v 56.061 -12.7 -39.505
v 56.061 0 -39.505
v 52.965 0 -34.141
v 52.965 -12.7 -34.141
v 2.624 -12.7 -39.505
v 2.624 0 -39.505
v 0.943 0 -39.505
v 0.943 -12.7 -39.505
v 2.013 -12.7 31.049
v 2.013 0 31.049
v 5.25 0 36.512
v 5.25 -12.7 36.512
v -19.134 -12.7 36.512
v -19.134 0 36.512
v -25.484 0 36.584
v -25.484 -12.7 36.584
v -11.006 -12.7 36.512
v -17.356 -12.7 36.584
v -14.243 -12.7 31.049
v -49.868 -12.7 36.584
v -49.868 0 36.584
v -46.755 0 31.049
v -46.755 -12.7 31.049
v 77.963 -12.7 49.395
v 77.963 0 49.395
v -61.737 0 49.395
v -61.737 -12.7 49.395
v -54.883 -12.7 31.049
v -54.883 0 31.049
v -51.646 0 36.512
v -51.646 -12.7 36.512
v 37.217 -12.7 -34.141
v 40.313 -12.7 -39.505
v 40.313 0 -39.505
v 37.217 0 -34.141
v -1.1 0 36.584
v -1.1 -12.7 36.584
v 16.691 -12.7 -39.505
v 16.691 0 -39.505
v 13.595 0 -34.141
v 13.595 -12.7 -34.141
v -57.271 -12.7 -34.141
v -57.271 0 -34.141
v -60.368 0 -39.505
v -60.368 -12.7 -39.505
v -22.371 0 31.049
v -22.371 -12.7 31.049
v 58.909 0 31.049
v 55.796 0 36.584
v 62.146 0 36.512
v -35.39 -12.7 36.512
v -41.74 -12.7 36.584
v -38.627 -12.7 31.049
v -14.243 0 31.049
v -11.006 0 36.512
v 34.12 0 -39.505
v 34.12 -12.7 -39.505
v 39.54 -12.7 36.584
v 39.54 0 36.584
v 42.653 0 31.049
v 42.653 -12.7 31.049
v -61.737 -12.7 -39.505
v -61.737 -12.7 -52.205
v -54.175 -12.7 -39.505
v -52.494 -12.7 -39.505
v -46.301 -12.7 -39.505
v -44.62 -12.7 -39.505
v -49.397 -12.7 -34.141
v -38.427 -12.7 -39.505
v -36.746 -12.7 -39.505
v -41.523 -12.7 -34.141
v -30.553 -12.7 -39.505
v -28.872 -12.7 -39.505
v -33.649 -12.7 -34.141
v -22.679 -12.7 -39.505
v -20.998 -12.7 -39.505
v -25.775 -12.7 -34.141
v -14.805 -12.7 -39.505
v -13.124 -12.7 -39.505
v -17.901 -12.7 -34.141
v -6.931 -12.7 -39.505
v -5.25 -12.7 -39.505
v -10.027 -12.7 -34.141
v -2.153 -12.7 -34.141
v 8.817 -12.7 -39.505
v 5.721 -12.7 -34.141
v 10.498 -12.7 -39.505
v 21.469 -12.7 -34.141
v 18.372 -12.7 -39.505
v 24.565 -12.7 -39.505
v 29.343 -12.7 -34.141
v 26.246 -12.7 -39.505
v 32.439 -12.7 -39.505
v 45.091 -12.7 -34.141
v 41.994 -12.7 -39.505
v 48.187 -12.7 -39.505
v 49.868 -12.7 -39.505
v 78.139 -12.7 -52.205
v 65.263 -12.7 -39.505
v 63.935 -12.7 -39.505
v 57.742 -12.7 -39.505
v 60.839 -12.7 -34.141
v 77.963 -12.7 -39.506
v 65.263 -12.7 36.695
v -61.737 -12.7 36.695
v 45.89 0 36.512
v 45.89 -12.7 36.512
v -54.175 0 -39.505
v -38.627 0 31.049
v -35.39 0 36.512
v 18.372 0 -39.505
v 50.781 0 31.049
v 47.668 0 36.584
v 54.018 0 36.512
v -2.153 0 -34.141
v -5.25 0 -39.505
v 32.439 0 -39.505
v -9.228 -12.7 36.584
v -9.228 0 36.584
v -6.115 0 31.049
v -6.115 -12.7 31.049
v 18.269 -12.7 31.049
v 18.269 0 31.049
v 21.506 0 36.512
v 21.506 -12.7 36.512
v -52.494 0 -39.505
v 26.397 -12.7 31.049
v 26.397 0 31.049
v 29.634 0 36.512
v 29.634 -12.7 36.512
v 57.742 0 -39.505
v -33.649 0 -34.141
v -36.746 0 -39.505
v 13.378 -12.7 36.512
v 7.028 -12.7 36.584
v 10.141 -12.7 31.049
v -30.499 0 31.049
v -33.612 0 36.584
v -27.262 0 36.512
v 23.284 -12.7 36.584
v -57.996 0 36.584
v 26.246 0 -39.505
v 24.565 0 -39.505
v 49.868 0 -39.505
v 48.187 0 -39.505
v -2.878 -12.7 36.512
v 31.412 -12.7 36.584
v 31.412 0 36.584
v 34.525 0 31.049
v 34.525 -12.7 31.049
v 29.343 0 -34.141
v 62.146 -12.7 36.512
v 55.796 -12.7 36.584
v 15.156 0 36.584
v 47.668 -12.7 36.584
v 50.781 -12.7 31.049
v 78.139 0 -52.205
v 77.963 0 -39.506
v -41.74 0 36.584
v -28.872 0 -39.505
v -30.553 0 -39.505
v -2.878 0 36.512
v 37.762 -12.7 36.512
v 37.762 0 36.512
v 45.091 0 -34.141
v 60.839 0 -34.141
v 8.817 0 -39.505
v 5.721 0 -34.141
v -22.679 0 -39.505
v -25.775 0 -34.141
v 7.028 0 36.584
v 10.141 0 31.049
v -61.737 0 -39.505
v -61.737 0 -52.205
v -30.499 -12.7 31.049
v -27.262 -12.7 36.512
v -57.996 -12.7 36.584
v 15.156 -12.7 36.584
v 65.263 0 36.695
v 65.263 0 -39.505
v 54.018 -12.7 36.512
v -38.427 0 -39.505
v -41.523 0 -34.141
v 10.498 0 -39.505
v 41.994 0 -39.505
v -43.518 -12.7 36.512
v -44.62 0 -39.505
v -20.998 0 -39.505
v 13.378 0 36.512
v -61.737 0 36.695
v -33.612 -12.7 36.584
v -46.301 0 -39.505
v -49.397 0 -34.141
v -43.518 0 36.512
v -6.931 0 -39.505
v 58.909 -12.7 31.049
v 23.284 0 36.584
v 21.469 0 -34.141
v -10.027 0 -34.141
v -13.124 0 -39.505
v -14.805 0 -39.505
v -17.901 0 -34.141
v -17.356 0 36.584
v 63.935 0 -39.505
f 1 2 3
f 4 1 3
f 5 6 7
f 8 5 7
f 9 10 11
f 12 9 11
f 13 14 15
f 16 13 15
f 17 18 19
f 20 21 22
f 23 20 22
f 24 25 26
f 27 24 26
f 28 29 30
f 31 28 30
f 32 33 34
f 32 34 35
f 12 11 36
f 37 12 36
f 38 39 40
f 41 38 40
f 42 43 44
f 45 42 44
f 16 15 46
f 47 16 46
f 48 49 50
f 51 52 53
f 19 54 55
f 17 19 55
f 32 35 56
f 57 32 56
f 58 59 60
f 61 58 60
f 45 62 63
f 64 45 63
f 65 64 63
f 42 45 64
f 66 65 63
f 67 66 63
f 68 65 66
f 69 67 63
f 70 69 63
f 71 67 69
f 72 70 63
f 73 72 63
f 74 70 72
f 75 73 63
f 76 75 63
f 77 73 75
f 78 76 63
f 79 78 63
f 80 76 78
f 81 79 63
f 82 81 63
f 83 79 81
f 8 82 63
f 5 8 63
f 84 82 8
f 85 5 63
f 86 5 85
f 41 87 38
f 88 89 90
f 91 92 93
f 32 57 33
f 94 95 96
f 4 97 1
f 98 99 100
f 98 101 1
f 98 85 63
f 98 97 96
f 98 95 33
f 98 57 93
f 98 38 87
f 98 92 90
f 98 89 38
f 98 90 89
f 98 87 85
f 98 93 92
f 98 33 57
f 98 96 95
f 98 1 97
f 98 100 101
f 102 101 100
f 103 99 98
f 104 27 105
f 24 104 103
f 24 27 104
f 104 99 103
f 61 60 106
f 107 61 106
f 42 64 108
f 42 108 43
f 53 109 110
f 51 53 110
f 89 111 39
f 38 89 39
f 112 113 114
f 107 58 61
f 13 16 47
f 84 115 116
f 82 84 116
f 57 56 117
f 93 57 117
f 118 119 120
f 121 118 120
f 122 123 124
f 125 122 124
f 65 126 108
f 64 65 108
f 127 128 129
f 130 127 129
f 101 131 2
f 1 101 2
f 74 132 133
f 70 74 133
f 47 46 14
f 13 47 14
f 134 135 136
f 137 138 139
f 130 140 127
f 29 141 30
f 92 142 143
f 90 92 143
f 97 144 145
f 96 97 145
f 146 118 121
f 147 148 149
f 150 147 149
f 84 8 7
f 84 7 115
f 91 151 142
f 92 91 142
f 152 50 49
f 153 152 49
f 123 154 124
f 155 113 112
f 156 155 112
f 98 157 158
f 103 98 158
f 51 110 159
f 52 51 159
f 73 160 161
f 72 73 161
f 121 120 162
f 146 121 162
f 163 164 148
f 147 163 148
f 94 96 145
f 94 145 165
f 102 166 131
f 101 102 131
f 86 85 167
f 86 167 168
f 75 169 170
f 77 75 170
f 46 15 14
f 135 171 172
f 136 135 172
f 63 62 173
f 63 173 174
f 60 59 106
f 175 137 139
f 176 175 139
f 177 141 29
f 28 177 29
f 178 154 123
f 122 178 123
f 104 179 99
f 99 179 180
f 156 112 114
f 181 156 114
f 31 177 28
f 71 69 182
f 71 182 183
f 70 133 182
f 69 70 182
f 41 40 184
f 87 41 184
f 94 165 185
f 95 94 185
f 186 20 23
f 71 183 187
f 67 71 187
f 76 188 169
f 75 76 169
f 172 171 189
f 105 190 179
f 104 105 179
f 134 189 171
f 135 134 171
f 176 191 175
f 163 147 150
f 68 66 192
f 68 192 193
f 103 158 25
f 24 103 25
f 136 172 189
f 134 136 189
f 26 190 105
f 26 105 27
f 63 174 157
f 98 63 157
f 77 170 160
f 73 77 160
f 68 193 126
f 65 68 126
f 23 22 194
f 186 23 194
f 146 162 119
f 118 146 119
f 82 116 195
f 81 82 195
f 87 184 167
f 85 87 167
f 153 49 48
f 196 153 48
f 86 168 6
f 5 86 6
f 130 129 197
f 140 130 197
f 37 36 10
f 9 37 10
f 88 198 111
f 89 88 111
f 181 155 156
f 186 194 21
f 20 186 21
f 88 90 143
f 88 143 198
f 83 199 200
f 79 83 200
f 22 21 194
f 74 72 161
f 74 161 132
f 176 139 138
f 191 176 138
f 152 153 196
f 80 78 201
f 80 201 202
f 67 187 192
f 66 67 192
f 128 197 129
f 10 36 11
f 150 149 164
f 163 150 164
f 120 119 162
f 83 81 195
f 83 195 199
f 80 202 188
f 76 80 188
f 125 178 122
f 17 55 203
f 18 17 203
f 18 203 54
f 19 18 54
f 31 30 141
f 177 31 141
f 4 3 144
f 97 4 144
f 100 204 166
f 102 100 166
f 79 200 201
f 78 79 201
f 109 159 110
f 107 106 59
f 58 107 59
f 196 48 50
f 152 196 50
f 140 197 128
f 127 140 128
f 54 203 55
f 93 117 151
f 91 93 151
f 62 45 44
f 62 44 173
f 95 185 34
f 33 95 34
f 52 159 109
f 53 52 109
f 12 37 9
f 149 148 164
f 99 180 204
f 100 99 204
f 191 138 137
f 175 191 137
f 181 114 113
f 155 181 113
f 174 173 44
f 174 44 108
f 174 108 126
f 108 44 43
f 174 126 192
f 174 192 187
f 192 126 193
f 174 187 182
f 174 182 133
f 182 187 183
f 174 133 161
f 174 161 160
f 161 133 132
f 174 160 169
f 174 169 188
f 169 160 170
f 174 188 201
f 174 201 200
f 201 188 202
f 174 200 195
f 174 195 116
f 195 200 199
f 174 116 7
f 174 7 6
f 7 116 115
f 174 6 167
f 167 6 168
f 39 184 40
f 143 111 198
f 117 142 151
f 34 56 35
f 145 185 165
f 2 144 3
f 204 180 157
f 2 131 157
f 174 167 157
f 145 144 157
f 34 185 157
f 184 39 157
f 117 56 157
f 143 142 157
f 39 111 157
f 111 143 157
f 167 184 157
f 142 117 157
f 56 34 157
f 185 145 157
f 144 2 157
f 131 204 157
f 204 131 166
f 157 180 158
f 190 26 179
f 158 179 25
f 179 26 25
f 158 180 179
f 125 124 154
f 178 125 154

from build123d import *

# Parameters (mm, degrees)
F0_W     = 127
F0_H     = 12.7
F1_DEPTH = 12.7
F3_DEPTH = 12.7
F5_DEPTH = 12.7


with BuildPart() as f1:
    # F0 (on Front) → F1 (new body)
    with BuildSketch(Plane.XZ):
        Polygon((65.263382, 49.395234), (65.263382, 36.695234), (65.263382, -39.504766), (77.963382, -39.505983), (77.963382, 49.395234), align=None)
        with Locations((1.763382, 43.045234)):
            Rectangle(F0_W, F0_H)
        Polygon((77.963382, -39.505983), (65.263382, -39.504766), (-61.736618, -39.504766), (-61.736618, -52.204766), (78.139244, -52.204766), align=None)
    extrude(amount=F1_DEPTH)

    # F4 (on Front) → F5 (join)
    with BuildSketch(Plane.XZ):
        Polygon((-54.096439, -39.640051), (-57.271437, -34.140791), (-60.446439, -39.640051), align=None)
        Polygon((-46.222439, -39.640051), (-49.397437, -34.140791), (-52.572439, -39.640051), align=None)
        Polygon((-38.348439, -39.640051), (-41.523437, -34.140791), (-44.698439, -39.640051), align=None)
        Polygon((-30.474439, -39.640051), (-33.649437, -34.140791), (-36.824439, -39.640051), align=None)
        Polygon((-22.600439, -39.640051), (-25.775437, -34.140791), (-28.950439, -39.640051), align=None)
        Polygon((-14.726439, -39.640051), (-17.901437, -34.140791), (-21.076439, -39.640051), align=None)
        Polygon((-6.852439, -39.640051), (-10.027437, -34.140791), (-13.202439, -39.640051), align=None)
        Polygon((1.021561, -39.640051), (-2.153437, -34.140791), (-5.328439, -39.640051), align=None)
        Polygon((8.895561, -39.640051), (5.720563, -34.140791), (2.545561, -39.640051), align=None)
        Polygon((16.769561, -39.640051), (13.594563, -34.140791), (10.419561, -39.640051), align=None)
        Polygon((24.643561, -39.640051), (21.468563, -34.140791), (18.293561, -39.640051), align=None)
        Polygon((40.391561, -39.640051), (37.216563, -34.140791), (34.041561, -39.640051), align=None)
        Polygon((48.265561, -39.640051), (45.090563, -34.140791), (41.915561, -39.640051), align=None)
        Polygon((56.139561, -39.640051), (52.964563, -34.140791), (49.789561, -39.640051), align=None)
        Polygon((57.663561, -39.640051), (64.013561, -39.640051), (60.838563, -34.140791), align=None)
        Polygon((32.517561, -39.640051), (29.342563, -34.140791), (26.167561, -39.640051), align=None)
    extrude(amount=F5_DEPTH)


with BuildPart() as f3:
    # F2 (on Front) → F3 (new body)
    with BuildSketch(Plane.XZ):
        Polygon((-57.995697, 36.583982), (-54.883398, 31.048994), (-51.646107, 36.511818), align=None)
        Polygon((-49.867697, 36.583982), (-46.755398, 31.048994), (-43.518107, 36.511818), align=None)
        Polygon((-41.739697, 36.583982), (-38.627398, 31.048994), (-35.390107, 36.511818), align=None)
        Polygon((-33.611697, 36.583982), (-30.499398, 31.048994), (-27.262107, 36.511818), align=None)
        Polygon((-25.483697, 36.583982), (-22.371398, 31.048994), (-19.134107, 36.511818), align=None)
        Polygon((-17.355697, 36.583982), (-14.243398, 31.048994), (-11.006107, 36.511818), align=None)
        Polygon((-9.227697, 36.583982), (-6.115398, 31.048994), (-2.878107, 36.511818), align=None)
        Polygon((-1.099697, 36.583982), (2.012602, 31.048994), (5.249893, 36.511818), align=None)
        Polygon((7.028303, 36.583982), (10.140602, 31.048994), (13.377893, 36.511818), align=None)
        Polygon((15.156303, 36.583982), (18.268602, 31.048994), (21.505893, 36.511818), align=None)
        Polygon((23.284303, 36.583982), (26.396602, 31.048994), (29.633893, 36.511818), align=None)
        Polygon((31.412303, 36.583982), (34.524602, 31.048994), (37.761893, 36.511818), align=None)
        Polygon((39.540303, 36.583982), (42.652602, 31.048994), (45.889893, 36.511818), align=None)
        Polygon((47.668303, 36.583982), (50.780602, 31.048994), (54.017893, 36.511818), align=None)
        Polygon((58.908602, 31.048994), (62.145893, 36.511818), (55.796303, 36.583982), align=None)
    extrude(amount=F3_DEPTH)


solid = Compound([f1.part, f3.part])
